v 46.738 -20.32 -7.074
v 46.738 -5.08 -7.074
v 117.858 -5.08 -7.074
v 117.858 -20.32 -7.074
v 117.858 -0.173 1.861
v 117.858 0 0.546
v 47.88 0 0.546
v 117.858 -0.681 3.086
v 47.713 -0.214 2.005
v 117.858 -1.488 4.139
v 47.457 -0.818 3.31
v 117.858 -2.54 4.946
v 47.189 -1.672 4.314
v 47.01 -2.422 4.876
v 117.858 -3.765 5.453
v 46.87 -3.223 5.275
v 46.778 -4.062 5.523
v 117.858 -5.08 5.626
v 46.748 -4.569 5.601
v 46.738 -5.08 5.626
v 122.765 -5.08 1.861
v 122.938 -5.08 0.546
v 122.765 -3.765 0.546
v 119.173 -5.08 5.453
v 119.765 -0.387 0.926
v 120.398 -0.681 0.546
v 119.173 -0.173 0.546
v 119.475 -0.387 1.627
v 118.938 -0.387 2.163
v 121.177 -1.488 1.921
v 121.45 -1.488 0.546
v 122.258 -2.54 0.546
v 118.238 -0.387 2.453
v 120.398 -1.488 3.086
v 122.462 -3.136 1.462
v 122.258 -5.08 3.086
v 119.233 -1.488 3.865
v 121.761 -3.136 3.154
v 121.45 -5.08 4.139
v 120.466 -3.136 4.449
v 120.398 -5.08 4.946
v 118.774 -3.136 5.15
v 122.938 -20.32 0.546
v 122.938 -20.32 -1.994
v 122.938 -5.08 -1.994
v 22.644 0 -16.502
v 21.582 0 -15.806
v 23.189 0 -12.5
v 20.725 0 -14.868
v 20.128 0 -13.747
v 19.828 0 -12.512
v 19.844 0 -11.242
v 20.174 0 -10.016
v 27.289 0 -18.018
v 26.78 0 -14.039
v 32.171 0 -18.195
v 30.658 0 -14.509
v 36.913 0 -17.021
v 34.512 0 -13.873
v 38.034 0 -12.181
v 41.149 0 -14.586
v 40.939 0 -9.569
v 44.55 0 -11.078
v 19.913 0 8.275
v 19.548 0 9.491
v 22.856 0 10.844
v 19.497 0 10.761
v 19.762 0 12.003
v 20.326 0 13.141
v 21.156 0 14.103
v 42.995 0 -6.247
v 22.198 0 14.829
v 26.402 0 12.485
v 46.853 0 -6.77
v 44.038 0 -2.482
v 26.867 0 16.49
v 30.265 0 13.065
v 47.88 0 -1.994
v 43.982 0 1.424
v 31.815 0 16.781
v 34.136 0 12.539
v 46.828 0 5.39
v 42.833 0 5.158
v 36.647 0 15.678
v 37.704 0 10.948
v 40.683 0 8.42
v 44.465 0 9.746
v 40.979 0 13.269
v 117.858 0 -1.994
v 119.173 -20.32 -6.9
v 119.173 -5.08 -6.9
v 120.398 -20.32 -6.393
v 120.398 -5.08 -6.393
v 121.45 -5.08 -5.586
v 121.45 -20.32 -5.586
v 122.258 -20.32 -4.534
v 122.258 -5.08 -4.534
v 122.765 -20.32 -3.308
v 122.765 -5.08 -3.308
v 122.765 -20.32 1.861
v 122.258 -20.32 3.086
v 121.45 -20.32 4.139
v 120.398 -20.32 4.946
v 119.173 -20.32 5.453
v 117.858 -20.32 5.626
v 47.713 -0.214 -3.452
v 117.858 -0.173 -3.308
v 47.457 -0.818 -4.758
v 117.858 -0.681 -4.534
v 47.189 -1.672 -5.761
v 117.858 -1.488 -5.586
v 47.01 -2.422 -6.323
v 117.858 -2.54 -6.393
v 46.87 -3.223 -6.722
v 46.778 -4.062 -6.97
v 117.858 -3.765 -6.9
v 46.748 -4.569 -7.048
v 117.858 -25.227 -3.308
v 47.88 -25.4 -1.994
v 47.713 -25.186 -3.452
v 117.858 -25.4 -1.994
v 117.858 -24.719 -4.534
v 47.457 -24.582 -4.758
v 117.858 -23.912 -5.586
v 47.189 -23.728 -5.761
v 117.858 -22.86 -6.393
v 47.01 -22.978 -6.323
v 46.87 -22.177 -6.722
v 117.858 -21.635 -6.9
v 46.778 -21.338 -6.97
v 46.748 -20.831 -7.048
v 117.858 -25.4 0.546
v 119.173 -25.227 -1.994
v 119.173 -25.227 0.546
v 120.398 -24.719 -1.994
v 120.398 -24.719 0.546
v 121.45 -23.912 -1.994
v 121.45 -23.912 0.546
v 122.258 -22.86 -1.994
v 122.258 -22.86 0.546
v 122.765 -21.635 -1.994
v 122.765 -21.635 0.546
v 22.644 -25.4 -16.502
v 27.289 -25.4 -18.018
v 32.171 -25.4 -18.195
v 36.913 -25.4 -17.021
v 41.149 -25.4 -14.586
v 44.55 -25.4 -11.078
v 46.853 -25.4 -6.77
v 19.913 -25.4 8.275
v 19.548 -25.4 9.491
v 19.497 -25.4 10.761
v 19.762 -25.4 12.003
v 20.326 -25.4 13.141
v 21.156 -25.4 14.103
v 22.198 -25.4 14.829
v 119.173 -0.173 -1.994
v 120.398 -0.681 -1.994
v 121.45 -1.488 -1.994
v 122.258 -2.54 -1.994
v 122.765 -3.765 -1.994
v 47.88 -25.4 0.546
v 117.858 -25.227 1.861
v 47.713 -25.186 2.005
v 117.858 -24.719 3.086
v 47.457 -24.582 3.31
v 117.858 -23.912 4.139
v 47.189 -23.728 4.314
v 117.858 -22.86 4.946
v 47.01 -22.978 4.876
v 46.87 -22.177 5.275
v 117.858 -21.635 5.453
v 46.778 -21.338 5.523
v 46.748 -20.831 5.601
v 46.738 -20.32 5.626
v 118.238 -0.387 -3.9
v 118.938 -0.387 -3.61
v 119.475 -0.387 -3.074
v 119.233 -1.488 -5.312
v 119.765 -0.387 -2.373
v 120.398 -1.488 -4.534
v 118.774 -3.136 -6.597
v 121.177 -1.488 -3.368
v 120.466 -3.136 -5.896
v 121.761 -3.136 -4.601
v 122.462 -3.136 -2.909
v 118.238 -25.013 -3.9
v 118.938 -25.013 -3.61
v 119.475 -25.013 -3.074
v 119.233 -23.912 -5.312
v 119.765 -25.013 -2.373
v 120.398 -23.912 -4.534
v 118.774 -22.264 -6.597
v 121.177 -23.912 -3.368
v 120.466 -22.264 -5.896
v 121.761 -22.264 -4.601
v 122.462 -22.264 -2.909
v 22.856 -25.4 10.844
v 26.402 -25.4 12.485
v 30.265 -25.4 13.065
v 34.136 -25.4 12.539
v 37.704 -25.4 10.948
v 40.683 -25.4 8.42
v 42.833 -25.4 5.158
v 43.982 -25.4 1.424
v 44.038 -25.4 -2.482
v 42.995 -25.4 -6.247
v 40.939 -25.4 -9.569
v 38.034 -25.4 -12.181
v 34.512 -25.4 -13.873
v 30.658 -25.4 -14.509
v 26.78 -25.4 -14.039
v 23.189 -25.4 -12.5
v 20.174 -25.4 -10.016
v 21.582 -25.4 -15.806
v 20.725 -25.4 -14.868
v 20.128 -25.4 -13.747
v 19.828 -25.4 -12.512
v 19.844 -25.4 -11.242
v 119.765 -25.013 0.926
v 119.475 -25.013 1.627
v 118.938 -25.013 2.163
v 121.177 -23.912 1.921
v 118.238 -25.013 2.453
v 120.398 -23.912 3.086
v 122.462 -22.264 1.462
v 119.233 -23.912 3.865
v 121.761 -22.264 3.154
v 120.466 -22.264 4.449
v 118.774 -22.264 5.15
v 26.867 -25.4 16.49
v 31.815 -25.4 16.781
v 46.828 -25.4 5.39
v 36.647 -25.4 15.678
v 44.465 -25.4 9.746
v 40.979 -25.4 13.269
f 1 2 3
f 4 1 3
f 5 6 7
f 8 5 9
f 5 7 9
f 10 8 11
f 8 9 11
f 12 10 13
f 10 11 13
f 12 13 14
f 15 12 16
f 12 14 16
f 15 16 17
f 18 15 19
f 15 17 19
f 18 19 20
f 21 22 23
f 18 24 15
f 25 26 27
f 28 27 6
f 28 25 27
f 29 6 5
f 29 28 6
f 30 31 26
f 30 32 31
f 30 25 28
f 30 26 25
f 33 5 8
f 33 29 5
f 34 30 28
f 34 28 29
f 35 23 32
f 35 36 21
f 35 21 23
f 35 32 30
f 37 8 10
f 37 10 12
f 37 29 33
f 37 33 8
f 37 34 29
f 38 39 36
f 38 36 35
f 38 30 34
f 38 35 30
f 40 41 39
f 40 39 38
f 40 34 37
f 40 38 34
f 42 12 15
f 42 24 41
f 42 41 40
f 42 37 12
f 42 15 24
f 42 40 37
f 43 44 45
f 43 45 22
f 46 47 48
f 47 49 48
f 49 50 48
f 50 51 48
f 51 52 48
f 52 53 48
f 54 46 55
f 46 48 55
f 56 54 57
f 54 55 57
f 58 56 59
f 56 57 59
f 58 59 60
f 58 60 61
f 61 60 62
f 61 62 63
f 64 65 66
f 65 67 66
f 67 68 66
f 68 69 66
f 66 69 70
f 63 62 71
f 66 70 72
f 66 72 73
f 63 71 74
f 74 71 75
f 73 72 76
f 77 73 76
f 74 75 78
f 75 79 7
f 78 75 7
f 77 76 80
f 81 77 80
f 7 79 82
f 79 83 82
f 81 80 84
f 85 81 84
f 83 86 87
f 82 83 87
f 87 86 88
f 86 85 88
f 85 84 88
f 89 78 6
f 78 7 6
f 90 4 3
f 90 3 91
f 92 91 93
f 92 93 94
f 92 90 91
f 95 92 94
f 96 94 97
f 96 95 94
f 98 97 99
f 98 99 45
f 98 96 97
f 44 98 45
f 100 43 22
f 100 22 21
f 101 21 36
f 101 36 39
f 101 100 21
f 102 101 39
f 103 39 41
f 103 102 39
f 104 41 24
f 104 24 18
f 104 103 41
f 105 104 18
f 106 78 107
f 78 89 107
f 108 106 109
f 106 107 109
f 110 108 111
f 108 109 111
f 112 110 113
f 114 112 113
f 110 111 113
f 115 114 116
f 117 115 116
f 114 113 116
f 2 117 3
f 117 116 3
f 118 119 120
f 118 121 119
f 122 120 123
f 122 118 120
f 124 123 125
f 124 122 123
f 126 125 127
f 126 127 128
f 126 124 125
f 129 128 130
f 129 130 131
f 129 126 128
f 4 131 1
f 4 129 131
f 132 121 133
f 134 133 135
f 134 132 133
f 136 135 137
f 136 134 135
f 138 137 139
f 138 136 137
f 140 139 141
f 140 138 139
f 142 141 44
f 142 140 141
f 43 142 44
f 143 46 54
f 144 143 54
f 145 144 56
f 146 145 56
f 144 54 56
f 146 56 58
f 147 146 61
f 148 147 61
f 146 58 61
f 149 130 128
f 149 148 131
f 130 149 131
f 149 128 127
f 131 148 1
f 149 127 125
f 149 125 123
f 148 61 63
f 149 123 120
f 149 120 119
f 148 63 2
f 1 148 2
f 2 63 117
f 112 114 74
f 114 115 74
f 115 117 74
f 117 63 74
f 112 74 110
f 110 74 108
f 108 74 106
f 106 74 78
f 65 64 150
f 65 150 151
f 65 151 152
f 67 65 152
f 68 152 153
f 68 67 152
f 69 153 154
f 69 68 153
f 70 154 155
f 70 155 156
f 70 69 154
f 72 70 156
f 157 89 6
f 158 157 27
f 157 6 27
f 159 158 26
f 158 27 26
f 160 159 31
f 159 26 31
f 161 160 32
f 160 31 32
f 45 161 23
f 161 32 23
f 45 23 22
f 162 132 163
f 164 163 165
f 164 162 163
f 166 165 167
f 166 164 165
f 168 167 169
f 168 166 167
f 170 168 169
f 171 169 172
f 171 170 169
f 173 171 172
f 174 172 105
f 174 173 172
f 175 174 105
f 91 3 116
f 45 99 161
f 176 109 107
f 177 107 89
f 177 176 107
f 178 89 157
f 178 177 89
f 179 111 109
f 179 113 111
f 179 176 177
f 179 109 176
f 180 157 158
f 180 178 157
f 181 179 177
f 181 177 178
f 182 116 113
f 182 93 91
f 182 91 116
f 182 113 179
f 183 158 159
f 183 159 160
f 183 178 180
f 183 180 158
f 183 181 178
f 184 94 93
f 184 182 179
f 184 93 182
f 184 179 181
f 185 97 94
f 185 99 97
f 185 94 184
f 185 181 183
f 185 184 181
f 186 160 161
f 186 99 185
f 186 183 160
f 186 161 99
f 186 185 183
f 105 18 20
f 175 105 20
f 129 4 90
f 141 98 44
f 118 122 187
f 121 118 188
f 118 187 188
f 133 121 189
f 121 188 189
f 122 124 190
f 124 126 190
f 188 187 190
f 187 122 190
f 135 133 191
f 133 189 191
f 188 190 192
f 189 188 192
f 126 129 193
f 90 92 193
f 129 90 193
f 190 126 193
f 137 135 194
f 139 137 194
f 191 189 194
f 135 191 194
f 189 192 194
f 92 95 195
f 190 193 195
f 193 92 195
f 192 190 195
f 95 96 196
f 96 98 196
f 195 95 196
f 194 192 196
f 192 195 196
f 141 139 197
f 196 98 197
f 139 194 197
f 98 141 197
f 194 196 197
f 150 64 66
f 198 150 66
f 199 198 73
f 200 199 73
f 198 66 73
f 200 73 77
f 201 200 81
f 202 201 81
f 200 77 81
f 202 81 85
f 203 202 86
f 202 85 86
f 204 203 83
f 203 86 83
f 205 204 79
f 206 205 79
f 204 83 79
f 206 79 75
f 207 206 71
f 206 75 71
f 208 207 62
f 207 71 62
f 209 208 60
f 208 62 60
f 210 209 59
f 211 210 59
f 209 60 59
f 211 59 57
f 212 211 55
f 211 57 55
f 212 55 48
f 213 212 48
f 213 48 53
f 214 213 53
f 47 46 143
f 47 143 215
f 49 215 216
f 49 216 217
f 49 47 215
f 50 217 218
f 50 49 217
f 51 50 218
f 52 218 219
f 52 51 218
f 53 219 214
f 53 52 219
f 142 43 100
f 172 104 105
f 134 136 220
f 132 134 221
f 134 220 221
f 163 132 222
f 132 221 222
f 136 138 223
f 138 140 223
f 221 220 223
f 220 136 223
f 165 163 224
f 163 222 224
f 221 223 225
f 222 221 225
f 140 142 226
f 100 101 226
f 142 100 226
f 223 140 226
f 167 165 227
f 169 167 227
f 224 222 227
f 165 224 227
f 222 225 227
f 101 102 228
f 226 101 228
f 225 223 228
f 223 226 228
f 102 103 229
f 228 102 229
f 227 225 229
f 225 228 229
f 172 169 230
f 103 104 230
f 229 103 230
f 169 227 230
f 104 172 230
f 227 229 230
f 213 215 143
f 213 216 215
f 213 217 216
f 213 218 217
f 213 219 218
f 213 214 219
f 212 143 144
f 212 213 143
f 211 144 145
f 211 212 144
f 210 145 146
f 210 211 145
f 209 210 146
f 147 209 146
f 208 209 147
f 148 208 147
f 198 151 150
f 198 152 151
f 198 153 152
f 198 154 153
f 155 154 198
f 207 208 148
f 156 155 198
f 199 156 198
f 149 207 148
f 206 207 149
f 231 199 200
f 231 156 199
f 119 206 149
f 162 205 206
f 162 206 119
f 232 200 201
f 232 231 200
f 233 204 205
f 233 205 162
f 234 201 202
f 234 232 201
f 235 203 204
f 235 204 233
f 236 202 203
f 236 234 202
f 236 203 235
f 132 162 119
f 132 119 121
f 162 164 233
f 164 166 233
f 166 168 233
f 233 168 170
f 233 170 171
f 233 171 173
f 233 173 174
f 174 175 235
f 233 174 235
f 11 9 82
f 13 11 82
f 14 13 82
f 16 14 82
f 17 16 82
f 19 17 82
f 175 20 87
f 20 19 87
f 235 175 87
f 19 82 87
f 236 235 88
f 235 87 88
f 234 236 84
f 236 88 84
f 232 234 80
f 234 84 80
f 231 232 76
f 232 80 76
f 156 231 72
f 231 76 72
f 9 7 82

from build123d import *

# Parameters (mm, degrees)
F1_DEPTH    = 25.4
F2_F1_R     = 5.08
F2_F2_R     = 5.08
F2_F3_R     = 5.08
F2_F4_R     = 5.08
F5_T1_DEPTH = 57.4399599705
F5_T3_DEPTH = 60.5847169717


# Not quite as in the source:
# - a fillet or chamfer that OpenCascade refuses, or shapes differently, is made with other operations: its cross-section is extruded or revolved along the edge and cut away or added
# - a feature of the source that left no trace in its solid (it failed there, or was rolled back) is left out


with BuildPart() as f1:
    # F0 (on Front) → F1 (new body)
    with BuildSketch(Plane.XZ):
        with BuildLine():
            ThreePointArc((19.913375901, 8.2747844221), (44.1487619553, -0.5270852778), (20.1739600729, -10.0158007924))
            Line((20.1739600729, -10.0158007924), (17.0700166839, -12.2068939621))
            ThreePointArc((17.0700166839, -12.2068939621), (33.3560783856, -18.0313258742), (46.7383854464, -7.0735126536))
            Line((46.7383854464, -7.0735126536), (46.7383854464, 5.6264873464))
            ThreePointArc((46.7383854464, 5.6264873464), (33.4251988827, 16.5721987148), (17.1621920022, 10.8656988202))
            Line((17.1621920022, 10.8656988202), (19.913375901, 8.2747844221))
        make_face()
        with BuildLine():
            Line((46.7383854464, 5.6264873464), (46.7383854464, -7.0735126536))
            ThreePointArc((46.7383854464, -7.0735126536), (47.9263685939, -0.7235126536), (46.7383854464, 5.6264873464))
        make_face()
        with BuildLine():
            ThreePointArc((46.7383854464, 5.6264873464), (47.9263685939, -0.7235126536), (46.7383854464, -7.0735126536))
            Line((46.7383854464, -7.0735126536), (122.9383854464, -7.0735126536))
            Line((122.9383854464, -7.0735126536), (122.9383854464, 5.6264873464))
            Line((122.9383854464, 5.6264873464), (46.7383854464, 5.6264873464))
        make_face()
    extrude(amount=F1_DEPTH)

    # F2: fillet of radius 5.08 on 4 edges, made by hand

    # F2_f1
    f2_f1_edges = [f1.edges().sort_by_distance(p)[0] for p in [
        (122.9383854464, -12.7, -7.0735126536),
    ]]
    fillet(f2_f1_edges, radius=F2_F1_R)

    # F2_f2
    f2_f2_edges = [f1.edges().sort_by_distance(p)[0] for p in [
        (122.9383854464, -12.7, 5.6264873464),
    ]]
    fillet(f2_f2_edges, radius=F2_F2_R)

    # F2_f3
    f2_f3_edges = [f1.edges().sort_by_distance(p)[0] for p in [
        (122.9383854464, 0, -0.7235126536),
    ]]
    fillet(f2_f3_edges, radius=F2_F3_R)

    # F2_f4
    f2_f4_edges = [f1.edges().sort_by_distance(p)[0] for p in [
        (122.9383854464, -25.4, -0.7235126536),
    ]]
    fillet(f2_f4_edges, radius=F2_F4_R)

    # F5: fillet of radius 5.08 on 2 edges, made by hand

    # F5_s2 → F5_t1 (cut)
    with BuildSketch(Plane.XZ.offset(-16.0199799852)):
        with BuildLine():
            ThreePointArc((19.913375901, 8.2747844221), (19.7615867452, 12.0028035456), (22.1975397768, 14.8289846016))
            ThreePointArc((22.1975397768, 14.8289846016), (19.4976030488, 13.0789063368), (17.1621920022, 10.8656988202))
            Line((17.1621920022, 10.8656988202), (19.913375901, 8.2747844221))
        make_face()
    extrude(amount=F5_T1_DEPTH, mode=Mode.SUBTRACT)

    # F5_s4 → F5_t3 (cut)
    with BuildSketch(Plane.XZ.offset(-17.5923584858)):
        with BuildLine():
            ThreePointArc((22.6439130786, -16.5022695354), (20.1284364115, -13.7466310122), (20.1739600729, -10.0158007924))
            Line((20.1739600729, -10.0158007924), (17.0700166839, -12.2068939621))
            ThreePointArc((17.0700166839, -12.2068939621), (19.6396592089, -14.6365685699), (22.6439130786, -16.5022695354))
        make_face()
    extrude(amount=F5_T3_DEPTH, mode=Mode.SUBTRACT)


solid = f1.part
